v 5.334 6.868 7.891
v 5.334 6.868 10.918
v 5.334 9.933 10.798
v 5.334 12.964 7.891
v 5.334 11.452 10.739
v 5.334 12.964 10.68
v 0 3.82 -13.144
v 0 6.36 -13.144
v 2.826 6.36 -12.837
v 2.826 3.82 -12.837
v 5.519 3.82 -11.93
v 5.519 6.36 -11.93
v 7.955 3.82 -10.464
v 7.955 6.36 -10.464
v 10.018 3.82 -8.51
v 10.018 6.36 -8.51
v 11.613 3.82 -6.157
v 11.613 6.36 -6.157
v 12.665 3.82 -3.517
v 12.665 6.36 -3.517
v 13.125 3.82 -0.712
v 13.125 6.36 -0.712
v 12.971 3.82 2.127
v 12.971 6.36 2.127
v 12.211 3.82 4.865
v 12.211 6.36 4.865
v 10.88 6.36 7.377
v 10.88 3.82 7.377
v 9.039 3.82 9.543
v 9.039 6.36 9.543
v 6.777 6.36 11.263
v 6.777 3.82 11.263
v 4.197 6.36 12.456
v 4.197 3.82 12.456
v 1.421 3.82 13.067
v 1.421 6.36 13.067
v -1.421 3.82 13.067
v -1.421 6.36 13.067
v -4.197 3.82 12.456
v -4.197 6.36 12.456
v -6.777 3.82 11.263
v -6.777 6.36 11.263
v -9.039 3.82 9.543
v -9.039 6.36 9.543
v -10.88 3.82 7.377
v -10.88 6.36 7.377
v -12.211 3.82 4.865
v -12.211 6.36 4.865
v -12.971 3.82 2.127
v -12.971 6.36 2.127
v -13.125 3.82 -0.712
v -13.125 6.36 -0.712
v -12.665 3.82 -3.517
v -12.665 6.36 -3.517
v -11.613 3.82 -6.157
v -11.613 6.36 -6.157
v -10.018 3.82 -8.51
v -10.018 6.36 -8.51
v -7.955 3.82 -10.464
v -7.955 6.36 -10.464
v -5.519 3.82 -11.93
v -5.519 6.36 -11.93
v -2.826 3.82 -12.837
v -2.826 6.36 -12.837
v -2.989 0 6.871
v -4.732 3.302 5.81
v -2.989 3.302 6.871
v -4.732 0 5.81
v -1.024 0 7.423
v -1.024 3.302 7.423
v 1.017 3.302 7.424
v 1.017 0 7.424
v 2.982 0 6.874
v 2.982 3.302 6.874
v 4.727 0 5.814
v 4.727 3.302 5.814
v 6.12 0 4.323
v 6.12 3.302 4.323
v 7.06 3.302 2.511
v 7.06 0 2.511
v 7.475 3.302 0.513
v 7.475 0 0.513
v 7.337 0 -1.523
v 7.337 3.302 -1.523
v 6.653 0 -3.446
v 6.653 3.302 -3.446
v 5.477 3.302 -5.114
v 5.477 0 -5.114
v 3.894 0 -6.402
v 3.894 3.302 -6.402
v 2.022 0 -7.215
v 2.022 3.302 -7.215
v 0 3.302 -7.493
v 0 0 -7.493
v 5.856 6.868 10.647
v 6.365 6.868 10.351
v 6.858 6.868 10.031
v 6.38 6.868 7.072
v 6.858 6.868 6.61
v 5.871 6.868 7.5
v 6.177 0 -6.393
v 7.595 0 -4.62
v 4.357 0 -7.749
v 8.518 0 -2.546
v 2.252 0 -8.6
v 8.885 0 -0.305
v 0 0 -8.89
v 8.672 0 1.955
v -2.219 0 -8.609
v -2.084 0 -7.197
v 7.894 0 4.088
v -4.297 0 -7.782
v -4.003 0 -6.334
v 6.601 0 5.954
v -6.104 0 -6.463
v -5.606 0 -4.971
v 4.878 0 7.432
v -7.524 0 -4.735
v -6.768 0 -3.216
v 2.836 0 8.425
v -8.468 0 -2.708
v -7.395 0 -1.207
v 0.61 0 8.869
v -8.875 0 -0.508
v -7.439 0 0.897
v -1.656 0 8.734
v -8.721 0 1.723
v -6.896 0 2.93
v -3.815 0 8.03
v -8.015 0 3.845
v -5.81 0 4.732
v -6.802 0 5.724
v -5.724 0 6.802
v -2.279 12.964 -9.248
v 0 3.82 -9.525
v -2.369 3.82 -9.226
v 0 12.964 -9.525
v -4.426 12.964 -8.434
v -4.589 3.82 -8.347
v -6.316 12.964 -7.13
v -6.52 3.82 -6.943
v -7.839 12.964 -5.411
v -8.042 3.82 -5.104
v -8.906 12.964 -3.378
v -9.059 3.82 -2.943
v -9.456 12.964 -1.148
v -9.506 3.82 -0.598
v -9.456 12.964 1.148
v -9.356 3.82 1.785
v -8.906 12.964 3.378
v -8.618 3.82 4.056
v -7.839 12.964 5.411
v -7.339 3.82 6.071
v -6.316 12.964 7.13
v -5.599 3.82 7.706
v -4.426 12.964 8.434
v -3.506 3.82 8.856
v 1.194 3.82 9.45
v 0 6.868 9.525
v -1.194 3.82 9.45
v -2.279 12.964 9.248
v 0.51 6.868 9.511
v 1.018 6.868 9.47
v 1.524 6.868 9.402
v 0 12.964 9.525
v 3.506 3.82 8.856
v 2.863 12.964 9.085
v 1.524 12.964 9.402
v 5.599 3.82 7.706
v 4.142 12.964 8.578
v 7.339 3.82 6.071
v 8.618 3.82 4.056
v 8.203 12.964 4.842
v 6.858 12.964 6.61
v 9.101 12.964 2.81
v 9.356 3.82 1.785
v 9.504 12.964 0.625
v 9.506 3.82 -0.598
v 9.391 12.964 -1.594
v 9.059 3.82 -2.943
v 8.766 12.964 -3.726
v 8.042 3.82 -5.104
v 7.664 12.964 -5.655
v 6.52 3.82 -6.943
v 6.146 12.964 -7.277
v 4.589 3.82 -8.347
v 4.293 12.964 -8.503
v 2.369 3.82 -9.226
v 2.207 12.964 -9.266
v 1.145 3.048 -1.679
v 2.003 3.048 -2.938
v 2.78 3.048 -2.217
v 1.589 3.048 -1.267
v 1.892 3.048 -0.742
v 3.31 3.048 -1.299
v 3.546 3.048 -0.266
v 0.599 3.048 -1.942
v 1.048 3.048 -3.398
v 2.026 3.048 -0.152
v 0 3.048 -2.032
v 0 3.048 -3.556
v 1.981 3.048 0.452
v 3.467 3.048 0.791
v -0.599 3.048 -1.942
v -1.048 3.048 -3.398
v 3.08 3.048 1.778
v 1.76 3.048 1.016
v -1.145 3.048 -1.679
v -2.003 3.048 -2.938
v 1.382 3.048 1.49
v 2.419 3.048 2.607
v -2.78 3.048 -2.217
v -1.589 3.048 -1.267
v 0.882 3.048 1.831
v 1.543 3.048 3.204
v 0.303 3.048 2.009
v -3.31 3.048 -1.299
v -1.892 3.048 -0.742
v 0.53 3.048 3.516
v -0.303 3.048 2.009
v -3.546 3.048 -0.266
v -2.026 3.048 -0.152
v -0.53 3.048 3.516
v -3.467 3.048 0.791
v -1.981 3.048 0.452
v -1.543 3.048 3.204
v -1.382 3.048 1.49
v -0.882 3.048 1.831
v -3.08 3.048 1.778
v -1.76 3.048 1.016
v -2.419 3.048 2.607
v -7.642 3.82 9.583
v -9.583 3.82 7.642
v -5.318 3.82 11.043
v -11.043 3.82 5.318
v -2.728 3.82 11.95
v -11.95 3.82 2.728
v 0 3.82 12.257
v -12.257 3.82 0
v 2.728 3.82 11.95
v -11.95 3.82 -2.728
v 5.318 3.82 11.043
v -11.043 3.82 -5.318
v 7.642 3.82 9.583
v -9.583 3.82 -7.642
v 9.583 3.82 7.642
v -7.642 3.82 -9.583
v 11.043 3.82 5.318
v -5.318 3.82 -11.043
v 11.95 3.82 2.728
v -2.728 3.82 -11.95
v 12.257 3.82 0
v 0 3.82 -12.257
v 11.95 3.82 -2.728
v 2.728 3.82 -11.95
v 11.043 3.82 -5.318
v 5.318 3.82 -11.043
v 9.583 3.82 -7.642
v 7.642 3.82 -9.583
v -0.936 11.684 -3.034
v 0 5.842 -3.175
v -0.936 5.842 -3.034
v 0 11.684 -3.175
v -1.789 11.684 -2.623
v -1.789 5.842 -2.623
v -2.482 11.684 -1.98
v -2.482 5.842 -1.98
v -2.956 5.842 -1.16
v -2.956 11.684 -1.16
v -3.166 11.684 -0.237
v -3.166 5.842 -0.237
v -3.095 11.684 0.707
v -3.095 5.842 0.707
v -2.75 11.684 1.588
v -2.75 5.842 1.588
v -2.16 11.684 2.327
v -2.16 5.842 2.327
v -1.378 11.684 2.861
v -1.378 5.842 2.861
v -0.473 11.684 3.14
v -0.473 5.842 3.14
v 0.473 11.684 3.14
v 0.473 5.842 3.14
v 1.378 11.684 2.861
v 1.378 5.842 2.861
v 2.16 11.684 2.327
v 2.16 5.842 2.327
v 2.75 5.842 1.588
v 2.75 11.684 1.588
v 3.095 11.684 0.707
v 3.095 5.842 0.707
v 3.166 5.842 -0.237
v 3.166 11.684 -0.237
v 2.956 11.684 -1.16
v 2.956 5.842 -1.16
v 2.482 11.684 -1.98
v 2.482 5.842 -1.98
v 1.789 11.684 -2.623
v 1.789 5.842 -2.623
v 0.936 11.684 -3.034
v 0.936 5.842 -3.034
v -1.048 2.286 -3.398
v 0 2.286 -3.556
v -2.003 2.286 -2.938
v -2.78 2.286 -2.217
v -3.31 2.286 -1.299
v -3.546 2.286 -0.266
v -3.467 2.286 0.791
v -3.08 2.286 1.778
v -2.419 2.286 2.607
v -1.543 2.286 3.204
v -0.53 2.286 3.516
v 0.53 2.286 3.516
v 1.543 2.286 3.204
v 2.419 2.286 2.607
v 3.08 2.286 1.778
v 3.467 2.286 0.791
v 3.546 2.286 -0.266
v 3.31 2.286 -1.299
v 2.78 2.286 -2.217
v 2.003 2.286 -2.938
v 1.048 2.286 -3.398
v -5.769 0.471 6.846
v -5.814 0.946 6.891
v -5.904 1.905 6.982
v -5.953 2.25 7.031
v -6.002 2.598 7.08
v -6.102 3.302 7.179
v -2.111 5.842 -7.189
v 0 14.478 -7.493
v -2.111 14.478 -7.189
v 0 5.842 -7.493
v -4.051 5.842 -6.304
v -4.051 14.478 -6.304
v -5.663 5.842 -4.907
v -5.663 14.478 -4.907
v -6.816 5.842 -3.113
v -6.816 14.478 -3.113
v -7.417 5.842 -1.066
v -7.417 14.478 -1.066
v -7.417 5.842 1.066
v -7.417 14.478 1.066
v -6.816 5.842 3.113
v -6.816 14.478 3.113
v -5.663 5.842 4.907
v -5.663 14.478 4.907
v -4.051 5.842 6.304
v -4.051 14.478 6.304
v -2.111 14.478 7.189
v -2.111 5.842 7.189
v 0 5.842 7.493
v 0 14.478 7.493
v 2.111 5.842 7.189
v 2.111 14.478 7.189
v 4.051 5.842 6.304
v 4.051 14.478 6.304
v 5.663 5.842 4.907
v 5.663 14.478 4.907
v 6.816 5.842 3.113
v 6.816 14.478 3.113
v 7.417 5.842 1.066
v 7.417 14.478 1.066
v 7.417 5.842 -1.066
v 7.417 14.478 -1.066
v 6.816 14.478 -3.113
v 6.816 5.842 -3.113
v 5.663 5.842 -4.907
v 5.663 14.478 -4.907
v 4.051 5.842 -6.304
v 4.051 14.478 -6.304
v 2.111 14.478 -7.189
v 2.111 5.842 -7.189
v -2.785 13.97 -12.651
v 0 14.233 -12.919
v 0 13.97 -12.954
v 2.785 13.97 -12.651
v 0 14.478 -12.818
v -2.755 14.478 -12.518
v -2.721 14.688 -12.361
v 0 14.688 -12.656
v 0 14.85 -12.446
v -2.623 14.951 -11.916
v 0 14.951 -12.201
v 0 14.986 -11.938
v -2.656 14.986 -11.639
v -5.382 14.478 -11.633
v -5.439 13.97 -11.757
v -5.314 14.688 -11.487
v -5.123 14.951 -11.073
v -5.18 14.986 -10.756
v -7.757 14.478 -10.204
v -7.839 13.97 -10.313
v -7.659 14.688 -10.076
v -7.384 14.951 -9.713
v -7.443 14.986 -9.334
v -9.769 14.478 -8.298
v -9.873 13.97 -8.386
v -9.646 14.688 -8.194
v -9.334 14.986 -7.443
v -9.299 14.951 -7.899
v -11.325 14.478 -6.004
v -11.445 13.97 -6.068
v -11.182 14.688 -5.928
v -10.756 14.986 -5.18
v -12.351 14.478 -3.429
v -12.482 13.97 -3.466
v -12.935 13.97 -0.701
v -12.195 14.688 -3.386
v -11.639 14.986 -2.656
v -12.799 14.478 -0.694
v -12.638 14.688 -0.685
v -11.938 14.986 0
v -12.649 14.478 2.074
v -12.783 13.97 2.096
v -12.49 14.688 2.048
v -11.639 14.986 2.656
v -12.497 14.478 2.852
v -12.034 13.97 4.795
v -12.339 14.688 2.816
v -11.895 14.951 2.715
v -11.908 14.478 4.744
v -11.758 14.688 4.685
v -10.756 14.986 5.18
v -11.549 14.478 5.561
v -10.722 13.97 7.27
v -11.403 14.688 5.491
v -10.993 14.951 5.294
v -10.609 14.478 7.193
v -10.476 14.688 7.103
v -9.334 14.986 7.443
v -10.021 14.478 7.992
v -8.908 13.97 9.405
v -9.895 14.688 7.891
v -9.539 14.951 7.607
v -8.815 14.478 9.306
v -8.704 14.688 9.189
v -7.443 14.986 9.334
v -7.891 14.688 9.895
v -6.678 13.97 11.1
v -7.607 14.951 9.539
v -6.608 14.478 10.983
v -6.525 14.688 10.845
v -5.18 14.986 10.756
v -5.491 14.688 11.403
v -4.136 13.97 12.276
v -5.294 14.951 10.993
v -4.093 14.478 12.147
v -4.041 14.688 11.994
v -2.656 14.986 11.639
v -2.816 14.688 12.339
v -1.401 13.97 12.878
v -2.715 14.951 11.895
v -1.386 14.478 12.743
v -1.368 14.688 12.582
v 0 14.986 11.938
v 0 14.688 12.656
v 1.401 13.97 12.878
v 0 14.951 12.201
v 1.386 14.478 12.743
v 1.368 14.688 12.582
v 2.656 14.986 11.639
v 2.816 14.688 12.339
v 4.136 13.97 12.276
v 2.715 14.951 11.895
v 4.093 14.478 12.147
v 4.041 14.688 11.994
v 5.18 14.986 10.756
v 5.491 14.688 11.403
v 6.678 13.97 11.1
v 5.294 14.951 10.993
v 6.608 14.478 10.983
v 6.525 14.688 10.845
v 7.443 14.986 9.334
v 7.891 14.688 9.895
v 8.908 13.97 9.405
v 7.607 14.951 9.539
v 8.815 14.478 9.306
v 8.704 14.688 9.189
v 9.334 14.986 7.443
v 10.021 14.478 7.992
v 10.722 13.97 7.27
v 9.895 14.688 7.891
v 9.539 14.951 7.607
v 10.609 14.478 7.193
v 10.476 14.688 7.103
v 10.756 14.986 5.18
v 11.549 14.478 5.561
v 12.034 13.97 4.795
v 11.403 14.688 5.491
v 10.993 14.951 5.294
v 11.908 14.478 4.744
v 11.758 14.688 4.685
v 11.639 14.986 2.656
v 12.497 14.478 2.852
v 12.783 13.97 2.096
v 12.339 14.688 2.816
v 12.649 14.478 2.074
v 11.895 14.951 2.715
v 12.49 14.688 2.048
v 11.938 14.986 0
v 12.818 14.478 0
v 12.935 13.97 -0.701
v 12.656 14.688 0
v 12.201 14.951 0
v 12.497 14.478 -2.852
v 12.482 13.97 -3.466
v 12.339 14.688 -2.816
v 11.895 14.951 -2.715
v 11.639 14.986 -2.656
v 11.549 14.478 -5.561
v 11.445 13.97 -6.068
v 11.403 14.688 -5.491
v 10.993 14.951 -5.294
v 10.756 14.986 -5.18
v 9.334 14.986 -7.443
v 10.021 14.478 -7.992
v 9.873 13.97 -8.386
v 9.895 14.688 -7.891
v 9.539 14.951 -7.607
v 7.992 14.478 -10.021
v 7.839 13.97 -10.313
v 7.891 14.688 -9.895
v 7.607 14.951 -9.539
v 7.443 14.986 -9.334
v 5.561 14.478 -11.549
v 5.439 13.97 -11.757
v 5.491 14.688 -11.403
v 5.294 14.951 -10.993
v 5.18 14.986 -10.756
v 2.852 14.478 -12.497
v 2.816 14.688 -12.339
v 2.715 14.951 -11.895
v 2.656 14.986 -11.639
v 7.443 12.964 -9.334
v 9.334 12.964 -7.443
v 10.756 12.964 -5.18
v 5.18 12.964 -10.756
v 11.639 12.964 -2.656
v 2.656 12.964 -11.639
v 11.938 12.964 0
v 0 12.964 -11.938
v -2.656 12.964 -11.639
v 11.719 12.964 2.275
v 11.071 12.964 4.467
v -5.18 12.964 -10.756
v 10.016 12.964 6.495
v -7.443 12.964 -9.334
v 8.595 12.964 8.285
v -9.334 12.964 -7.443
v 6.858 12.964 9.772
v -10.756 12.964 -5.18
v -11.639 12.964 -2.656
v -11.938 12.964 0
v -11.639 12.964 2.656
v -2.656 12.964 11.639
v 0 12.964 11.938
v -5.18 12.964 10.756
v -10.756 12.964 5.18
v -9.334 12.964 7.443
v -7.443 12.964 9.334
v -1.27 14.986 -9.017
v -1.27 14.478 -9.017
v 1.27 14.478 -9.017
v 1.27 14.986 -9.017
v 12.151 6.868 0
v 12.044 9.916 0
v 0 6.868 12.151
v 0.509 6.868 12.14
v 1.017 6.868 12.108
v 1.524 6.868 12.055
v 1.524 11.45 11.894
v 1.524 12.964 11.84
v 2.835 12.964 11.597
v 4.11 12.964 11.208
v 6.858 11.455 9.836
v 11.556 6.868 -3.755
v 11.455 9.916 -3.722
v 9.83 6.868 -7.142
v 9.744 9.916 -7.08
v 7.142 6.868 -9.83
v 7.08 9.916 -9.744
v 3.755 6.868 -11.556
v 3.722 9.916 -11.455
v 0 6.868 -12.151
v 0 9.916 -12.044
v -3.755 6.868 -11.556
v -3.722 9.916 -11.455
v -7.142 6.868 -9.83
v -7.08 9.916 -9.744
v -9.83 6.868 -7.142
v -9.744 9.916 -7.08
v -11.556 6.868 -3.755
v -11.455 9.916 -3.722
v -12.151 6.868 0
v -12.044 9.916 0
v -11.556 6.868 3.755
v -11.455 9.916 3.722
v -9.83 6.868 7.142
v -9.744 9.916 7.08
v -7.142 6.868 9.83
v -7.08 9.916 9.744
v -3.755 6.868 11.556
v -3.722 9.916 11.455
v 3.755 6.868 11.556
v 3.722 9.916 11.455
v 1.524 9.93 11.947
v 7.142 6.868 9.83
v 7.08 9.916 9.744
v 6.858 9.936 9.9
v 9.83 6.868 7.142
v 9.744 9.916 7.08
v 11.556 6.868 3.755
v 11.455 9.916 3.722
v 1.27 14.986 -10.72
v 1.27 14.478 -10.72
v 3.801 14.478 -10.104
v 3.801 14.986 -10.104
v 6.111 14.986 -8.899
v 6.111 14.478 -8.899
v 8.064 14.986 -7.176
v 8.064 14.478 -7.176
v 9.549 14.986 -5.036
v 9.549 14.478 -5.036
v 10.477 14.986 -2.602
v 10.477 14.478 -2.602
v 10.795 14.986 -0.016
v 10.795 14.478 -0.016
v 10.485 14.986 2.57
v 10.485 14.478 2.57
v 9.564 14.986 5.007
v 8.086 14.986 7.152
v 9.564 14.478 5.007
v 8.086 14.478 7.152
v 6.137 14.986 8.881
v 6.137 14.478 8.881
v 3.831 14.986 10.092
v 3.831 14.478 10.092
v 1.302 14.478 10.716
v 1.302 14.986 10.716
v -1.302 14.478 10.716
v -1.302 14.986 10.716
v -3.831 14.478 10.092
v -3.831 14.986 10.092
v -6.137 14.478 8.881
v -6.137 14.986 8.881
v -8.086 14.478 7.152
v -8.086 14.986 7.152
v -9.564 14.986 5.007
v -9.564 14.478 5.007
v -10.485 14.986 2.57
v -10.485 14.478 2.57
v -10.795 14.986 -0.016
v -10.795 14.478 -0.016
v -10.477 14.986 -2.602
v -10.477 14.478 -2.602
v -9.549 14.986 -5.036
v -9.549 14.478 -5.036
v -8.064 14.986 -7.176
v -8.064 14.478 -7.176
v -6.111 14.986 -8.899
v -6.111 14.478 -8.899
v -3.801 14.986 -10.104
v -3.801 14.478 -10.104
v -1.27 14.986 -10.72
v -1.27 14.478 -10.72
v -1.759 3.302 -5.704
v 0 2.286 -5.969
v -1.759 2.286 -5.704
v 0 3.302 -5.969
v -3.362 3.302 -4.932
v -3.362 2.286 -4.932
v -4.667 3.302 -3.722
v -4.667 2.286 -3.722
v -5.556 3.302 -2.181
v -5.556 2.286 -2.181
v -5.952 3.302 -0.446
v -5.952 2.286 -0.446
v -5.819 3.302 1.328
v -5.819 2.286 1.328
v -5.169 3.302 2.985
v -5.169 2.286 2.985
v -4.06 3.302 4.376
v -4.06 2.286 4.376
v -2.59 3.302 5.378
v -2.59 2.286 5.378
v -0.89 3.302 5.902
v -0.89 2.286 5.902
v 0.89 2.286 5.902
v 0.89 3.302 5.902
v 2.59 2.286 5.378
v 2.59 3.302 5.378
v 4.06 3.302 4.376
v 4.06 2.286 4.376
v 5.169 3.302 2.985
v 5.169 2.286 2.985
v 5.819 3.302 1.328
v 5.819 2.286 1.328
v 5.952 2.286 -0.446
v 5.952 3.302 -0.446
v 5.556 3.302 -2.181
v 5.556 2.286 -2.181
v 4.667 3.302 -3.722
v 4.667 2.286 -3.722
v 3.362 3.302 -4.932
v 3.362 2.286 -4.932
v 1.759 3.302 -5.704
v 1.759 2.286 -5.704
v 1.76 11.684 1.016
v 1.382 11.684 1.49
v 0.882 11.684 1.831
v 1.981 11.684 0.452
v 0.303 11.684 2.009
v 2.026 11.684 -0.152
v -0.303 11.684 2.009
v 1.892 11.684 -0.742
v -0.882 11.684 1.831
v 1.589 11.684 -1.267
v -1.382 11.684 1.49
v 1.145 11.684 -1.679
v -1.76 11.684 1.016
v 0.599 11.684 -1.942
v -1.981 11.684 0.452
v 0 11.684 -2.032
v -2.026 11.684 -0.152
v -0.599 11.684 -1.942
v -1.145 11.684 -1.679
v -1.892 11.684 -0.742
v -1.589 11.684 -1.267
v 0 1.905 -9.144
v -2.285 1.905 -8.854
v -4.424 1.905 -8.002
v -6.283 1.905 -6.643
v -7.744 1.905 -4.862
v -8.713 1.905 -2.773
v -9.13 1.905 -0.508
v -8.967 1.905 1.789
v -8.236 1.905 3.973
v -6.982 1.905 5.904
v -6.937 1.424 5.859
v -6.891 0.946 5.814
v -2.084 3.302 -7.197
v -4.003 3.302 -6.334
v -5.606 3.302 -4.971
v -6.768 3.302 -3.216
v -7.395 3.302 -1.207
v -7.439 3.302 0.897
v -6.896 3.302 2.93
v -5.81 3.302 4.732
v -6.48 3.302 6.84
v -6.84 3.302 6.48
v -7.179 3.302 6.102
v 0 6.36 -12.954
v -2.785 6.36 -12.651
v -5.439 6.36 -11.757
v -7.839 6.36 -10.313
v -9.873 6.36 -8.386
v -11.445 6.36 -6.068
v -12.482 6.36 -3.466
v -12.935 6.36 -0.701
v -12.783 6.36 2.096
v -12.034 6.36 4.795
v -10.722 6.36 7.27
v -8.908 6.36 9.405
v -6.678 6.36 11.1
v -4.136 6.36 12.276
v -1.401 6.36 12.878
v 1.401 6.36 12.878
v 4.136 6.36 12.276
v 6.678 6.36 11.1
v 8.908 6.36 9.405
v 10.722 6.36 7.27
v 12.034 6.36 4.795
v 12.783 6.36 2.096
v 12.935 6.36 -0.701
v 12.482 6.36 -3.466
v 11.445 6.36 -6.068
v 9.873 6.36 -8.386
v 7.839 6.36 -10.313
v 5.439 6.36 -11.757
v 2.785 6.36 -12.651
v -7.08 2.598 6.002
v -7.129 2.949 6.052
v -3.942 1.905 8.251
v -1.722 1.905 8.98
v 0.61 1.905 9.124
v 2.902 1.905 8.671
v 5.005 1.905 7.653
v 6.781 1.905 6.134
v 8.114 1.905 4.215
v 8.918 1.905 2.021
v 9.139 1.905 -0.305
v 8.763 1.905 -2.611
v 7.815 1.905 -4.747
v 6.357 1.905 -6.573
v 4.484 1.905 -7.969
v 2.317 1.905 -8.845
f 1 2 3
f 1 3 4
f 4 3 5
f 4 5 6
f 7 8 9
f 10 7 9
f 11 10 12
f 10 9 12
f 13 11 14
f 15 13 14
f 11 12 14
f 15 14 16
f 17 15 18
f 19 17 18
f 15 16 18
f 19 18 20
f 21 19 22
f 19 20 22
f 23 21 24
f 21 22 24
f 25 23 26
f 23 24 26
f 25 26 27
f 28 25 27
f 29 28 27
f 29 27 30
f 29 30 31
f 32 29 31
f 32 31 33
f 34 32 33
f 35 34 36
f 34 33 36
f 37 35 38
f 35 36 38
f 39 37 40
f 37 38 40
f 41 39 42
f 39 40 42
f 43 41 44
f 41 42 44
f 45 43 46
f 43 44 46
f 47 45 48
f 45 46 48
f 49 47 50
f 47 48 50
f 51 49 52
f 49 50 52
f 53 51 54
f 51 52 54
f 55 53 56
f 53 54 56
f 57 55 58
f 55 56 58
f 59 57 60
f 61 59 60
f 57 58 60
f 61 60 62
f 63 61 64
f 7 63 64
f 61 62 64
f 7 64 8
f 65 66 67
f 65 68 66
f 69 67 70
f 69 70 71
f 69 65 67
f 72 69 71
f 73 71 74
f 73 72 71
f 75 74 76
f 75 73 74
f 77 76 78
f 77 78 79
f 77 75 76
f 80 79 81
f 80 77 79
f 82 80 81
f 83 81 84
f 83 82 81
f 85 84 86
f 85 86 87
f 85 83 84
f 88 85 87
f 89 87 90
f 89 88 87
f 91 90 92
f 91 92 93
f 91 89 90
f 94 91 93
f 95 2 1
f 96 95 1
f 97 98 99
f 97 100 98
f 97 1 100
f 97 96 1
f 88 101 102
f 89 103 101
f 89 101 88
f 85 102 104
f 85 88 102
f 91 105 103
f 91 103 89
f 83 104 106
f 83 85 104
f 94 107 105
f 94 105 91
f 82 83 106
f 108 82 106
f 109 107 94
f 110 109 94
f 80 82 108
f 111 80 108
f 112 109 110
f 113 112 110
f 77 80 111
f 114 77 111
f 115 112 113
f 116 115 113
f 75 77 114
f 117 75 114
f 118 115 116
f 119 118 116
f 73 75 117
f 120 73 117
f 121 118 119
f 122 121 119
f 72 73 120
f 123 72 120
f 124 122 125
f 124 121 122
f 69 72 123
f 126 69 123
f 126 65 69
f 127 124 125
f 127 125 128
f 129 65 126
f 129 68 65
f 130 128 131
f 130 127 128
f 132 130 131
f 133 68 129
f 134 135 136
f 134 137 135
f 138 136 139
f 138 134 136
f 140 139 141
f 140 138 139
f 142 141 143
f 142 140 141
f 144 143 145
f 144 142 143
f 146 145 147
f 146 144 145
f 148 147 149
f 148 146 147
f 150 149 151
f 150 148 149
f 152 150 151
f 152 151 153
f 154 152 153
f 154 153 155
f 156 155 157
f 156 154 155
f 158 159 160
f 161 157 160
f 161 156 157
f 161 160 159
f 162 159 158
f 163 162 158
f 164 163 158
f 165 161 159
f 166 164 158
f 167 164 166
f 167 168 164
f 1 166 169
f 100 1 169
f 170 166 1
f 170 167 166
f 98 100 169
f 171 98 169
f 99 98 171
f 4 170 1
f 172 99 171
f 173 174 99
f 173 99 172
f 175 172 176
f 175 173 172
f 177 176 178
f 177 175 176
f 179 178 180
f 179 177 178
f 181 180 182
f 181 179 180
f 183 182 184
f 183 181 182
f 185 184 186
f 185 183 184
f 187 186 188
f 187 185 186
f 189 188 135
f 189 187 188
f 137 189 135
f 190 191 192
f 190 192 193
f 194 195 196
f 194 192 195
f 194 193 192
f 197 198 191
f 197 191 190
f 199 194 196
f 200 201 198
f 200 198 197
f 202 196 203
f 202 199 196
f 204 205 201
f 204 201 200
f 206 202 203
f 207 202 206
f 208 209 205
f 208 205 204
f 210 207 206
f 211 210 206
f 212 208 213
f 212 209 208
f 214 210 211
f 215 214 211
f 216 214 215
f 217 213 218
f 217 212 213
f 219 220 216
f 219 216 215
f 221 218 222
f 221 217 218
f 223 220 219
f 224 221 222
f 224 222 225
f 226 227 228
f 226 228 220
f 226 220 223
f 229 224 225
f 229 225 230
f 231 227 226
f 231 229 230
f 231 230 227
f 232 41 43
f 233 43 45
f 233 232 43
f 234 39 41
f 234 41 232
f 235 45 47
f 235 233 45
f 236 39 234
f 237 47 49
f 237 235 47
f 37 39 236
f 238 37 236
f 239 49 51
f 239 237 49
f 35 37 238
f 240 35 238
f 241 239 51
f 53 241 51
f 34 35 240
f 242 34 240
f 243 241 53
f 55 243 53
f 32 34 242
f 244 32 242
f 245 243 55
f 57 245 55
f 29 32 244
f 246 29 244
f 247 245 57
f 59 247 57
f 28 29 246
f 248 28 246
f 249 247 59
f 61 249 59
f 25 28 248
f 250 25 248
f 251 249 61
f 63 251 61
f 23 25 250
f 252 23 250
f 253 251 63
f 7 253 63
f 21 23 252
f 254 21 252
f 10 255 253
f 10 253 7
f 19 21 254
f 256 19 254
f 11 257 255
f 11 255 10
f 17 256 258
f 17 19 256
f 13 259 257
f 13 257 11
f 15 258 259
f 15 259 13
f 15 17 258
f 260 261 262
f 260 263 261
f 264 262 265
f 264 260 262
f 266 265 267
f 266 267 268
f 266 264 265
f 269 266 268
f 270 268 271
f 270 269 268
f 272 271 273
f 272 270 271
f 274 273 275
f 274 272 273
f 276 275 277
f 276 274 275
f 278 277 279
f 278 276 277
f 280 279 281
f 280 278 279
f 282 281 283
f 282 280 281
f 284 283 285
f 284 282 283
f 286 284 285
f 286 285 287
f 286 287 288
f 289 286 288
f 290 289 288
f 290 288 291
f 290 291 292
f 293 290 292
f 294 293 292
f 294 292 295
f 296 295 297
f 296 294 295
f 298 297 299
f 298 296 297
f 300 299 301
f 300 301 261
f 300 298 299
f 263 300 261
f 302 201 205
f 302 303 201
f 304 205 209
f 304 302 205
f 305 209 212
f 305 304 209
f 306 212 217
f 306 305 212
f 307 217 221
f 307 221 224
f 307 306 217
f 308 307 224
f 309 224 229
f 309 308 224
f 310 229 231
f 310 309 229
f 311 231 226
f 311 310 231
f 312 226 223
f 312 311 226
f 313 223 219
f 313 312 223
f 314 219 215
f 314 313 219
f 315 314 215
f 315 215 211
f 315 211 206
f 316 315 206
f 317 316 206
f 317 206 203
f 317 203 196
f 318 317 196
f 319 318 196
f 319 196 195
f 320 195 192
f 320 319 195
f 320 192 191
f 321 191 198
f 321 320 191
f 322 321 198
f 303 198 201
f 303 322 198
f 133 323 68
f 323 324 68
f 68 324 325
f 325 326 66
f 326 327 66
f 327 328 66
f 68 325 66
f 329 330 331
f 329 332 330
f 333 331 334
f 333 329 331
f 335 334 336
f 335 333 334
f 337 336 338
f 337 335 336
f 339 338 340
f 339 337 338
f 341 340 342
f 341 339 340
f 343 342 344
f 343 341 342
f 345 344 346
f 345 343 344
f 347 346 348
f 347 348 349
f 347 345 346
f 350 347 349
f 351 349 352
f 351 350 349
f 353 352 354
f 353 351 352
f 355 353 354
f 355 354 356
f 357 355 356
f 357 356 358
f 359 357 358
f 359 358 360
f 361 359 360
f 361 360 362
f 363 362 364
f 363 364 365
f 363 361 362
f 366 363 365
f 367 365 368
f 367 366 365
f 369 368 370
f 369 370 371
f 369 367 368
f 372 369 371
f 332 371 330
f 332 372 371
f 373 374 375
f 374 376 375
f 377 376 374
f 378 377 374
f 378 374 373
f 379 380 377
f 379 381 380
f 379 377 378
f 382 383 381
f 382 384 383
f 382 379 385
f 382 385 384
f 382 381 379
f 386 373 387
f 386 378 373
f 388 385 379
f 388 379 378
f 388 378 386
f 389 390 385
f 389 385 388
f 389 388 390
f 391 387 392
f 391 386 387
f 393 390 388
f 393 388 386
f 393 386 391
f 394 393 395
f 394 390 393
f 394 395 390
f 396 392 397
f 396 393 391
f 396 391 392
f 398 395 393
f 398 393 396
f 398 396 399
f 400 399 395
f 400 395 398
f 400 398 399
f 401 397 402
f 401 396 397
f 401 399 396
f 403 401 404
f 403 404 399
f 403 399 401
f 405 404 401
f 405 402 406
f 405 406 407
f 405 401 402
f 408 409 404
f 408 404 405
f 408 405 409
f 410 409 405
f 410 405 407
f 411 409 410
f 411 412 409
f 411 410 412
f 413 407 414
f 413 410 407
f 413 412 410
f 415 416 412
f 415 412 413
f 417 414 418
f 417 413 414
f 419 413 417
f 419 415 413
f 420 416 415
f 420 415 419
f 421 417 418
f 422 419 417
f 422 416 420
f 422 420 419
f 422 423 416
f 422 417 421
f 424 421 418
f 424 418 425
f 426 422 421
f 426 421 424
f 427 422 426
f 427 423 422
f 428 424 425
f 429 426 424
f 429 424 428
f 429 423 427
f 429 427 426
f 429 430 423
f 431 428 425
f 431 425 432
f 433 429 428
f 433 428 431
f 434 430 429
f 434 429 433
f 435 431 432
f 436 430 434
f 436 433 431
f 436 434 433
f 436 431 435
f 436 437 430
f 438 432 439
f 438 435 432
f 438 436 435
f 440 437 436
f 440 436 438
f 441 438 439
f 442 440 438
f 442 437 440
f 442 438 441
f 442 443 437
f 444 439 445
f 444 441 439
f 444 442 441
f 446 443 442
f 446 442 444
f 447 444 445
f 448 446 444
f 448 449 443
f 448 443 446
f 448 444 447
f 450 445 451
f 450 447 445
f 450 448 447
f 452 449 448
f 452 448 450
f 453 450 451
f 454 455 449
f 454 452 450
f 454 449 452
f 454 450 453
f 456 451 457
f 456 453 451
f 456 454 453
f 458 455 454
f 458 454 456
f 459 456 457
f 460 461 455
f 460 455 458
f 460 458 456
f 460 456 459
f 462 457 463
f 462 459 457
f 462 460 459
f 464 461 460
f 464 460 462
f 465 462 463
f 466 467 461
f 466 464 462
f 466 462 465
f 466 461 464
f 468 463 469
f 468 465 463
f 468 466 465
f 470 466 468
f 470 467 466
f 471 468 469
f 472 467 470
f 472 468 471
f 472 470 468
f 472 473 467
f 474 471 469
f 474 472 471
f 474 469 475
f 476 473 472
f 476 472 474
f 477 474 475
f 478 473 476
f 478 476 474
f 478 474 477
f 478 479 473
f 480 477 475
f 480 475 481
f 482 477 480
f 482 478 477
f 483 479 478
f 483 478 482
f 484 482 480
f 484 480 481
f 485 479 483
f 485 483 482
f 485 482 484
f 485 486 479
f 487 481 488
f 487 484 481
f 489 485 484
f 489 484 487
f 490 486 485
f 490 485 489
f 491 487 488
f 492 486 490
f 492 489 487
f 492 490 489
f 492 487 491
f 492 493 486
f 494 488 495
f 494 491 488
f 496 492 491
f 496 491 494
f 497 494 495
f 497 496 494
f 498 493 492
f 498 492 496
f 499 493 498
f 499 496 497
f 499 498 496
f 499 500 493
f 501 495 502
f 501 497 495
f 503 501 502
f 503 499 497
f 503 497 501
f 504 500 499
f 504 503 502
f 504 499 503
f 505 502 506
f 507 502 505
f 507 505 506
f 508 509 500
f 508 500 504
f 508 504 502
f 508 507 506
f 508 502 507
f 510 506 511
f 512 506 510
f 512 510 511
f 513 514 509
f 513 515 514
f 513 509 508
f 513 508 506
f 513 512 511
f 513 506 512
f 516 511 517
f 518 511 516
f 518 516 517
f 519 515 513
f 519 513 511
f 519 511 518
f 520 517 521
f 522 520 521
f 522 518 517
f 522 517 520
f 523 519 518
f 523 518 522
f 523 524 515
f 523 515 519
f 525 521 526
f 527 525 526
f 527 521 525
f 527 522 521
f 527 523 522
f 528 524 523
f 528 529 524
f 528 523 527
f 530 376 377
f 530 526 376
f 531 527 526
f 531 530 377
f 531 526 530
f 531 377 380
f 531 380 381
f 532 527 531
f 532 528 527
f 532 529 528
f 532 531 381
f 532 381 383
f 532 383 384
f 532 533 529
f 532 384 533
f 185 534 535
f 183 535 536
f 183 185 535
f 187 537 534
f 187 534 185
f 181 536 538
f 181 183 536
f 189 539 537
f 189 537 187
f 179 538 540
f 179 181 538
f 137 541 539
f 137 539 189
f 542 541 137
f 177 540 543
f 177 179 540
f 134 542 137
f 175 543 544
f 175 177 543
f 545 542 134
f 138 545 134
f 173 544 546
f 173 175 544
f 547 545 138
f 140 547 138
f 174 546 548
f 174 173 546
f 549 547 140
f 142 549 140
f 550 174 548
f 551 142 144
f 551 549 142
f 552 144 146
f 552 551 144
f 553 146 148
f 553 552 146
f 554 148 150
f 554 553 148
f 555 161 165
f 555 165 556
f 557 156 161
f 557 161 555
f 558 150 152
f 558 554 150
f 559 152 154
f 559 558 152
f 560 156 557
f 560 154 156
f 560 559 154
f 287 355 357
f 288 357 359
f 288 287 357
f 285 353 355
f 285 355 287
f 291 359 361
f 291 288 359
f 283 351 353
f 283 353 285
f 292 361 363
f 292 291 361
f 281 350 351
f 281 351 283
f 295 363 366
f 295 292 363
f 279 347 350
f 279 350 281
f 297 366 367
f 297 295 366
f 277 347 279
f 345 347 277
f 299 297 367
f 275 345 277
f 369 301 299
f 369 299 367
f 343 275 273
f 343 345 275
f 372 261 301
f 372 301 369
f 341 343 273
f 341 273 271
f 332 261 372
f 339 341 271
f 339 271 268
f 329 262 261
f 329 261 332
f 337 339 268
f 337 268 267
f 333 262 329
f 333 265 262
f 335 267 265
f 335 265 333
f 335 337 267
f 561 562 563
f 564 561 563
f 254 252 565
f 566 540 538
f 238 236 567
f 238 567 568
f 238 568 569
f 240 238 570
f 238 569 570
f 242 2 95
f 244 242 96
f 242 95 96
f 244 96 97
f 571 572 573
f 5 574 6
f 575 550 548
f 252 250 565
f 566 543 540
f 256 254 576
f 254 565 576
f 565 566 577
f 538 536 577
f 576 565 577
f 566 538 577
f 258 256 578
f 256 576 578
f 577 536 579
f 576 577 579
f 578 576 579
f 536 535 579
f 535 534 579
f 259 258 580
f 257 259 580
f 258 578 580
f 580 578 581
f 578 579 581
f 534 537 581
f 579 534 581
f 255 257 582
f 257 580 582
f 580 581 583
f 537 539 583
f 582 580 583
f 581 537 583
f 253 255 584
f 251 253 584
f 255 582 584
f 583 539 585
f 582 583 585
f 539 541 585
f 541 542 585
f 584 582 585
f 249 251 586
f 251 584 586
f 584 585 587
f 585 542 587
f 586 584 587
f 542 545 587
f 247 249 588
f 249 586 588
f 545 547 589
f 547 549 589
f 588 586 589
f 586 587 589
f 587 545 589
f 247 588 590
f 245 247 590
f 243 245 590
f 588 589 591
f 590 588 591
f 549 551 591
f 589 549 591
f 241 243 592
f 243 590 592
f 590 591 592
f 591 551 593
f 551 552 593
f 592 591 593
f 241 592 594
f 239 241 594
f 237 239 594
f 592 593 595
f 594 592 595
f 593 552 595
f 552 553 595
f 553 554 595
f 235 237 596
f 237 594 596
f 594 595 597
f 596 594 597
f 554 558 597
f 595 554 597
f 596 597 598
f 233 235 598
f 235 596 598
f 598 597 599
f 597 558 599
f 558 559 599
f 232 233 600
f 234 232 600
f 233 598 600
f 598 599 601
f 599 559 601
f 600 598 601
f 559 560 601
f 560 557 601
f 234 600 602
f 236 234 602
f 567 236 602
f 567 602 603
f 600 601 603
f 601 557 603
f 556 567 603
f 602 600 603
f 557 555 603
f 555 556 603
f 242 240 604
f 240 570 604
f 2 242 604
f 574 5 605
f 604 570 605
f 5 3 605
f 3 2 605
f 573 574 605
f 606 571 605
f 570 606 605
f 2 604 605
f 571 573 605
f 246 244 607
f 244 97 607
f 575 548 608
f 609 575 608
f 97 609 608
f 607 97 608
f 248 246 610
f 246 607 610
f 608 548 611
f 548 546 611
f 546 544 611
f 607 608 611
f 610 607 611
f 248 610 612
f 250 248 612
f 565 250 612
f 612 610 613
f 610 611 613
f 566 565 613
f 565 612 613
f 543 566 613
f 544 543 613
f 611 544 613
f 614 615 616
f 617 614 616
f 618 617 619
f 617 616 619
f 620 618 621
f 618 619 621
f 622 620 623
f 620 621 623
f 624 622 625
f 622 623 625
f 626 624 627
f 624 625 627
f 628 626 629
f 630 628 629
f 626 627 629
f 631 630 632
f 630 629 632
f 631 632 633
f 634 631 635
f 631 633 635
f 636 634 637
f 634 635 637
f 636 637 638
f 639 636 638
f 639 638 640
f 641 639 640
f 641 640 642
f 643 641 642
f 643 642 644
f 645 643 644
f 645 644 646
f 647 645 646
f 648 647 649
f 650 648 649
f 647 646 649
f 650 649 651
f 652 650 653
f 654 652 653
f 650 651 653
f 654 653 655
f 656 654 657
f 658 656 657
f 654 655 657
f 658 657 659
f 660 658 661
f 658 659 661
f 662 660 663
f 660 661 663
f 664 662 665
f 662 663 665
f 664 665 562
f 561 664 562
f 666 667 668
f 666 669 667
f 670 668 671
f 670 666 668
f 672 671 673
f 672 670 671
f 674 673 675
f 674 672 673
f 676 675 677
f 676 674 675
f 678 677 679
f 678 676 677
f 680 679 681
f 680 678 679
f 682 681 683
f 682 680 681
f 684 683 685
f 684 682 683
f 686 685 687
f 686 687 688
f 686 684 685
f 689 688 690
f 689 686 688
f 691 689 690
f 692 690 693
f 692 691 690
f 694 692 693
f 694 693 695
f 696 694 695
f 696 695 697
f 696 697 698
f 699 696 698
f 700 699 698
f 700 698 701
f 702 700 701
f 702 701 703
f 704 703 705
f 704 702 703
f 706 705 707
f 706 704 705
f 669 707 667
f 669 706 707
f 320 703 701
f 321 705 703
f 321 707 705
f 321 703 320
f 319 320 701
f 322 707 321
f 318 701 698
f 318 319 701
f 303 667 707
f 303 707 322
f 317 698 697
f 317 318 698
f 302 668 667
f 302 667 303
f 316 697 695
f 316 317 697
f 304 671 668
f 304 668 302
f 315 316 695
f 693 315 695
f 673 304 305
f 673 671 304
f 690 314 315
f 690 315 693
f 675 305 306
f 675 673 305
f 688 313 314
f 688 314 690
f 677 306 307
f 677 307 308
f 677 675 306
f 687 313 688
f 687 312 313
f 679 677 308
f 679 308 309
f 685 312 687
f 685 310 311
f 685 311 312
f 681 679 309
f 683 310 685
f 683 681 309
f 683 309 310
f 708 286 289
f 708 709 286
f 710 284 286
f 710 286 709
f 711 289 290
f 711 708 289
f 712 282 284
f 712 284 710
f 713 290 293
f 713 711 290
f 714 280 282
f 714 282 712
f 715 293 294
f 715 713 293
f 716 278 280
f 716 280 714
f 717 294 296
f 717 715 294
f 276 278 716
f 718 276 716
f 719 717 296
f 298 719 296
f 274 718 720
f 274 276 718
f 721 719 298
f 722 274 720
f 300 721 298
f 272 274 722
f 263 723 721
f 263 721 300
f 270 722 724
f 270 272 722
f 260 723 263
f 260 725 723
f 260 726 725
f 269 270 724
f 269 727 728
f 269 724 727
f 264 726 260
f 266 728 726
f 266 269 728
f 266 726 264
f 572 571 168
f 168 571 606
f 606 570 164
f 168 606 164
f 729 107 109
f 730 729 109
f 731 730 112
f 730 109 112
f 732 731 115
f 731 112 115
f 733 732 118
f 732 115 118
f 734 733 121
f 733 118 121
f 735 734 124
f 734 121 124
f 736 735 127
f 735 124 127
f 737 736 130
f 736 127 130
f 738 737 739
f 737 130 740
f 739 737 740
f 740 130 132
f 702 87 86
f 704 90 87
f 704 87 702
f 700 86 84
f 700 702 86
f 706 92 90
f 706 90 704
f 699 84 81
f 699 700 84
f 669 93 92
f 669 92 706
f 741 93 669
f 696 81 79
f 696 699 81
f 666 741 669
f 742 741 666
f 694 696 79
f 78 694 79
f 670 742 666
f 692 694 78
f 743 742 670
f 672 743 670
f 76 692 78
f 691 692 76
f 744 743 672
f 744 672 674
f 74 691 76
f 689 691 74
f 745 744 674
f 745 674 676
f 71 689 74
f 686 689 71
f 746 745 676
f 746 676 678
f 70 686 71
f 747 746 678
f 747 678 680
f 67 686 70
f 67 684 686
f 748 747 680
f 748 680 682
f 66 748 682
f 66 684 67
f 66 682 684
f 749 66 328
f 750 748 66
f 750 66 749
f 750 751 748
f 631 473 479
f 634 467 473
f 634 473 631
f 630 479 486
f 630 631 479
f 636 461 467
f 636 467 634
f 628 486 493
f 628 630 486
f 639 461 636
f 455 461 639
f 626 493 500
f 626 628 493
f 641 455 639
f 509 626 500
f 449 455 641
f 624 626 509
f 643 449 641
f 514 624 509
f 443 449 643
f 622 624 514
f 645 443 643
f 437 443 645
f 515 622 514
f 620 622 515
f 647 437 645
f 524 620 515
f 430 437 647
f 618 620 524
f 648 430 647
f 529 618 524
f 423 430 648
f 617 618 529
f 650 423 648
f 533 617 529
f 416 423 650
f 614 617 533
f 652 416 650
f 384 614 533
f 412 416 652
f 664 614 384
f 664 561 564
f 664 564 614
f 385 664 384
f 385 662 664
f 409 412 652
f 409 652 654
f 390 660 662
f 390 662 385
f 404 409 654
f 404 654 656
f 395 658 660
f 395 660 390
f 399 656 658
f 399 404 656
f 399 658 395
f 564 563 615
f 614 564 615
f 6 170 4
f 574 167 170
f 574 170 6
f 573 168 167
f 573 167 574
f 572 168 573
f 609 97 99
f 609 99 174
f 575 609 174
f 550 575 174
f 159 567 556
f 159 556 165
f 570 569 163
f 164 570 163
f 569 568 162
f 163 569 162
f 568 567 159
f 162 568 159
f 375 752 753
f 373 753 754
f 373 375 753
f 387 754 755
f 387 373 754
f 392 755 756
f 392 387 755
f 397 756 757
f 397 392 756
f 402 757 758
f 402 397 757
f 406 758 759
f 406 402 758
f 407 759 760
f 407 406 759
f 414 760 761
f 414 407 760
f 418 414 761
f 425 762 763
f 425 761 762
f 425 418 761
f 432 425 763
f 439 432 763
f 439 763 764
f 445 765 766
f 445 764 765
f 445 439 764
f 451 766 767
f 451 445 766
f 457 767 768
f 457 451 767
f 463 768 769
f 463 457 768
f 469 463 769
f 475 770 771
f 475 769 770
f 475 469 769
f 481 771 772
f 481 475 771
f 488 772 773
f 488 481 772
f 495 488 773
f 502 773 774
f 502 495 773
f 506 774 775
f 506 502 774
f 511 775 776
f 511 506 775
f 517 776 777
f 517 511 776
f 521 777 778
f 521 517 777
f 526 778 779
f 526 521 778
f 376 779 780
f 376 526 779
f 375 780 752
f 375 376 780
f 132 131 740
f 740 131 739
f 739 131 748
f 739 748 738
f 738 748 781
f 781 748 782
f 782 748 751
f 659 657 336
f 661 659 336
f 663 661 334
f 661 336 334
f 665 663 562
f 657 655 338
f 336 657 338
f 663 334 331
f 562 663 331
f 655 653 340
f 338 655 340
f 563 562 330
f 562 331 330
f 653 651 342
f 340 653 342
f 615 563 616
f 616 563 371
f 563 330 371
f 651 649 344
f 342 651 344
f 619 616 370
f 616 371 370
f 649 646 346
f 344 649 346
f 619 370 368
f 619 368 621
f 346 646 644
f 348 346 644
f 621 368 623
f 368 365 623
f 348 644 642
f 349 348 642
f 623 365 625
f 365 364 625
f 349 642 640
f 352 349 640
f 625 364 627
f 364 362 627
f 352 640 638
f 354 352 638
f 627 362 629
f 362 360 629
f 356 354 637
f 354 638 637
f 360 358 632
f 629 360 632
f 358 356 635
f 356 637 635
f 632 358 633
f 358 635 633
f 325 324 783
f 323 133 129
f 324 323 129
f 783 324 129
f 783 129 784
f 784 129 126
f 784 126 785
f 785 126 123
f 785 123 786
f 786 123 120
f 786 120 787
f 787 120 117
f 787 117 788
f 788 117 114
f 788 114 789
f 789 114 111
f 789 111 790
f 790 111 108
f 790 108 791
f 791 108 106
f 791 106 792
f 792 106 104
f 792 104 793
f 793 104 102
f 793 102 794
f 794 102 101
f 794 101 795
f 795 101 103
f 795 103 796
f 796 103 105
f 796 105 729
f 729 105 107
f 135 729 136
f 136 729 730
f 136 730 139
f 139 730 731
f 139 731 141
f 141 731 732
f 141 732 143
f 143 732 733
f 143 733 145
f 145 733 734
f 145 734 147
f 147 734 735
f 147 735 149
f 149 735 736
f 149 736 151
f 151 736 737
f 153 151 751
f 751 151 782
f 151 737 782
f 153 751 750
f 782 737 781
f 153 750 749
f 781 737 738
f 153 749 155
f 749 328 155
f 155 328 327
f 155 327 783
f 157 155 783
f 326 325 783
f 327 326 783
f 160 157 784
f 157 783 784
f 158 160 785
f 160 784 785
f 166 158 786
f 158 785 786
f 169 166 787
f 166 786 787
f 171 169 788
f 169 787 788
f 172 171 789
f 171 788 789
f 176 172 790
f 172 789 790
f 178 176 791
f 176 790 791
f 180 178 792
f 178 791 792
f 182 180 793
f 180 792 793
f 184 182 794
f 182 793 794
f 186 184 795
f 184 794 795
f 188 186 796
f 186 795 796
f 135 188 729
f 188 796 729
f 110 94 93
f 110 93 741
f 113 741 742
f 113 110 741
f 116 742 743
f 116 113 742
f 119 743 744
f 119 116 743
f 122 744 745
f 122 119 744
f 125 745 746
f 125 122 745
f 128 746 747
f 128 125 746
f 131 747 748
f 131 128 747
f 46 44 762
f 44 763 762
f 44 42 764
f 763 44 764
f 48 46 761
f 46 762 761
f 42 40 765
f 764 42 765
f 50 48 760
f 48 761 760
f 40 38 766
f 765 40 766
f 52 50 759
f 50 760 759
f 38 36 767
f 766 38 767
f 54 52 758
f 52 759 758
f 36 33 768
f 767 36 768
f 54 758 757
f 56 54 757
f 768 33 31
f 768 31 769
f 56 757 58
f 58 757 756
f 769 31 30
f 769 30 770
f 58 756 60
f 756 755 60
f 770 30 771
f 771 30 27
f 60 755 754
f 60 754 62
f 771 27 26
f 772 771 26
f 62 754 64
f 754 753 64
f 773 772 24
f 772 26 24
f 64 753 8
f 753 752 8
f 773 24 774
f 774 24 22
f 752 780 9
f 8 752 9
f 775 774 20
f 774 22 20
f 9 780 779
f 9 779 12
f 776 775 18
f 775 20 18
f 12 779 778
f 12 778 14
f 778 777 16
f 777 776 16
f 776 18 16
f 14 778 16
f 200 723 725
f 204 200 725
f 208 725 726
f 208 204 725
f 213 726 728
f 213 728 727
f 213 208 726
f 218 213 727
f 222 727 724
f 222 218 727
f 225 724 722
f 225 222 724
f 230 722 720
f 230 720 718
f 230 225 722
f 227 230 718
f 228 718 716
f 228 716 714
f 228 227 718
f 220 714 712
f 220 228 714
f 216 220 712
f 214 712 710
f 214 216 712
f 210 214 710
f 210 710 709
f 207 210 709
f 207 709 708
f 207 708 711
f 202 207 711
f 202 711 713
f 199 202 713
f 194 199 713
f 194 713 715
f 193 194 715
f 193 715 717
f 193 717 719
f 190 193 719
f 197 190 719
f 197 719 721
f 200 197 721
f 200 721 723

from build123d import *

# Parameters (mm, degrees)
FILLET1_R                            = 1.016
BOSS_EXTRUDE1_START                  = -2.54
SKETCH2_R                            = 13.1445
SKETCH2_R_2                          = 12.954
BOSS_EXTRUDE1_DEPTH                  = 2.54
CUT_EXTRUDE1_START                   = -0.508
SKETCH3_R                            = 7.493
CUT_EXTRUDE1_DEPTH                   = 0.508
CUT_EXTRUDE2_START                   = -3.302
CUT_EXTRUDE2_DEPTH                   = 3.302
RIB1_REACH                           = 25.878
SKETCH7_WALL_W                       = 52.380916808
SKETCH7_WALL_H                       = 1.524
BOSS_EXTRUDE2_REACH                  = 32.187
SKETCH9_W                            = 1.524
SKETCH9_H                            = 6.096
BOSS_EXTRUDE2_DIRECTION_2_REACH      = 32.187
BOSS_EXTRUDE2_DIRECTION_2_END_RADIUS = 9.525


# Read off the part's stored shape, not the designer's step: Draft1
with BuildPart() as part:
    # Sketch1 → Base-Revolve (revolve)
    with BuildSketch(Plane.XY, mode=Mode.PRIVATE) as base_revolve_sk:
        Polygon((12.954, 3.819921875), (12.954, 14.986), (7.493, 14.986), (7.493, 5.842), (3.175, 5.842), (3.175, 11.684), (2.032, 11.684), (2.032, 3.302), (7.493, 3.302), (7.493, 0), (9.525, 0), (9.525, 12.963921875), (11.938, 12.963921875), (11.938, 3.819921875), align=None)
    revolve(base_revolve_sk.sketch.rotate(Axis((0, 0, 0), (0, 1, 0)), 90), axis=Axis((0, 0, 0), (0, 1, 0)))

    # Fillet1
    fillet1_edges = [part.edges().sort_by_distance(p)[0] for p in [
        (0, 14.986, 12.954),
    ]]
    fillet(fillet1_edges, radius=FILLET1_R)

    # Sketch2 → Boss-Extrude1 (add)
    with BuildSketch(Plane.XZ.offset(-3.819921875).offset(BOSS_EXTRUDE1_START)):
        with Locations(Location((0, 0, 0), (0, 0, 270))):
            Circle(SKETCH2_R)
        with Locations(Location((0, 0, 0), (0, 0, 270))):
            Circle(SKETCH2_R_2, mode=Mode.SUBTRACT)
    extrude(amount=BOSS_EXTRUDE1_DEPTH)

    # Sketch3 → Cut-Extrude1 (cut)
    with BuildSketch(Plane(origin=(0, 14.986, 0), x_dir=(-1, 0, 0), z_dir=(0, 1, 0)).offset(CUT_EXTRUDE1_START)):
        with BuildLine():
            Line((1.27, -10.720033815), (1.27, -9.017))
            Line((1.27, -9.017), (-1.27, -9.017))
            Line((-1.27, -9.017), (-1.27, -10.720033815))
            ThreePointArc((-1.27, -10.720033815), (0, 10.795), (1.27, -10.720033815))
        make_face()
        with Locations(Location((0, 0, 0), (0, 0, 270))):
            Circle(SKETCH3_R, mode=Mode.SUBTRACT)
    extrude(amount=CUT_EXTRUDE1_DEPTH, mode=Mode.SUBTRACT)

    # Draft1 outline → Draft1 (revolve, cut)
    with BuildSketch(Plane.XY):
        Polygon((12.257315516, 3.819921875), (11.938, 12.963921875), (11.938, 3.819921875), align=None)
    revolve(axis=Axis((0, 0, 0), (0, 1, 0)), mode=Mode.SUBTRACT)

    # Sketch4 → Cut-Revolve1 (revolve, cut)
    with BuildSketch(Plane.XY, mode=Mode.PRIVATE) as cut_revolve1_sk:
        Polygon((9.525, 3.819921875), (9.144, 1.905), (8.89, 0), (9.525, 0), align=None)
    revolve(cut_revolve1_sk.sketch.rotate(Axis((0, 0, 0), (0, 1, 0)), 90), axis=Axis((0, 0, 0), (0, 1, 0)), mode=Mode.SUBTRACT)

    # Sketch5 → Boss-Revolve1 (revolve)
    with BuildSketch(Plane.XY, mode=Mode.PRIVATE) as boss_revolve1_sk:
        Polygon((2.032, 3.302), (2.032, 3.048), (3.556, 3.048), (3.556, 2.286), (5.969, 2.286), (5.969, 3.302), align=None)
    revolve(boss_revolve1_sk.sketch.rotate(Axis((0, 0, 0), (0, 1, 0)), 90), axis=Axis((0, 0, 0), (0, 1, 0)))

    # Sketch6 → Cut-Extrude2 (cut)
    with BuildSketch(Plane.XZ.offset(CUT_EXTRUDE2_START)):
        with BuildLine():
            Line((-6.174789514, 7.252420248), (-4.732067149, 5.809697884))
            ThreePointArc((-4.732067149, 5.809697884), (-5.298351111, 5.298351111), (-5.809697884, 4.732067149))
            Line((-5.809697884, 4.732067149), (-7.252420248, 6.174789514))
            ThreePointArc((-7.252420248, 6.174789514), (-6.735192091, 6.735192091), (-6.174789514, 7.252420248))
        make_face()
    extrude(amount=CUT_EXTRUDE2_DEPTH, mode=Mode.SUBTRACT)

    # Sketch7 wall → Rib1 (add, up to next)
    with BuildSketch(Plane(origin=(0, 6.867921875, 10.837938506), x_dir=(0, 0, -1), z_dir=(0, 1, 0)), mode=Mode.PRIVATE) as rib1_sk1:
        with Locations((0, -0.762)):
            Rectangle(SKETCH7_WALL_W, SKETCH7_WALL_H)
    rib1_tool1 = extrude(rib1_sk1.sketch, amount=RIB1_REACH, mode=Mode.PRIVATE) - part.part
    add(rib1_tool1.solids().sort_by_distance((0, 6.867921875, 10.837938506))[0])

    # Boss-Extrude2: up to this cone (the profile starts inside it)
    boss_extrude2_end = Plane(origin=(0, 9.915922, 0), z_dir=(0, -1, 0)) * Cone(10.482382248, 13.606494754, 89.462877002, mode=Mode.PRIVATE)
    # Sketch9 → Boss-Extrude2 (add, up to the surface)
    with BuildSketch(Plane.XY.offset(9.525), mode=Mode.PRIVATE) as boss_extrude2_sk1:
        with Locations((6.096, 9.915921875)):
            Rectangle(SKETCH9_W, SKETCH9_H)
    boss_extrude2_tool1 = extrude(boss_extrude2_sk1.sketch, amount=BOSS_EXTRUDE2_REACH, mode=Mode.PRIVATE) & boss_extrude2_end
    add(boss_extrude2_tool1.solids().sort_by_distance((6.096, 9.915922, 9.525))[0])

    # Boss-Extrude2 direction 2: up to this cylinder (the profile starts outside it)
    boss_extrude2_direction_2_end = Plane(origin=(0, 9.915922, 0), z_dir=(0, -1, 0)) * Cylinder(BOSS_EXTRUDE2_DIRECTION_2_END_RADIUS, 84.424, mode=Mode.PRIVATE)
    # Sketch9 → Boss-Extrude2 direction 2 (add, up to the surface)
    with BuildSketch(Plane.XY.offset(9.525), mode=Mode.PRIVATE) as boss_extrude2_direction_2_sk1:
        with Locations((6.096, 9.915921875)):
            Rectangle(SKETCH9_W, SKETCH9_H)
    boss_extrude2_direction_2_tool1 = extrude(boss_extrude2_direction_2_sk1.sketch, amount=-BOSS_EXTRUDE2_DIRECTION_2_REACH, mode=Mode.PRIVATE) - boss_extrude2_direction_2_end
    add(boss_extrude2_direction_2_tool1.solids().sort_by_distance((6.096, 9.915922, 9.525))[0])


solid = part.part
